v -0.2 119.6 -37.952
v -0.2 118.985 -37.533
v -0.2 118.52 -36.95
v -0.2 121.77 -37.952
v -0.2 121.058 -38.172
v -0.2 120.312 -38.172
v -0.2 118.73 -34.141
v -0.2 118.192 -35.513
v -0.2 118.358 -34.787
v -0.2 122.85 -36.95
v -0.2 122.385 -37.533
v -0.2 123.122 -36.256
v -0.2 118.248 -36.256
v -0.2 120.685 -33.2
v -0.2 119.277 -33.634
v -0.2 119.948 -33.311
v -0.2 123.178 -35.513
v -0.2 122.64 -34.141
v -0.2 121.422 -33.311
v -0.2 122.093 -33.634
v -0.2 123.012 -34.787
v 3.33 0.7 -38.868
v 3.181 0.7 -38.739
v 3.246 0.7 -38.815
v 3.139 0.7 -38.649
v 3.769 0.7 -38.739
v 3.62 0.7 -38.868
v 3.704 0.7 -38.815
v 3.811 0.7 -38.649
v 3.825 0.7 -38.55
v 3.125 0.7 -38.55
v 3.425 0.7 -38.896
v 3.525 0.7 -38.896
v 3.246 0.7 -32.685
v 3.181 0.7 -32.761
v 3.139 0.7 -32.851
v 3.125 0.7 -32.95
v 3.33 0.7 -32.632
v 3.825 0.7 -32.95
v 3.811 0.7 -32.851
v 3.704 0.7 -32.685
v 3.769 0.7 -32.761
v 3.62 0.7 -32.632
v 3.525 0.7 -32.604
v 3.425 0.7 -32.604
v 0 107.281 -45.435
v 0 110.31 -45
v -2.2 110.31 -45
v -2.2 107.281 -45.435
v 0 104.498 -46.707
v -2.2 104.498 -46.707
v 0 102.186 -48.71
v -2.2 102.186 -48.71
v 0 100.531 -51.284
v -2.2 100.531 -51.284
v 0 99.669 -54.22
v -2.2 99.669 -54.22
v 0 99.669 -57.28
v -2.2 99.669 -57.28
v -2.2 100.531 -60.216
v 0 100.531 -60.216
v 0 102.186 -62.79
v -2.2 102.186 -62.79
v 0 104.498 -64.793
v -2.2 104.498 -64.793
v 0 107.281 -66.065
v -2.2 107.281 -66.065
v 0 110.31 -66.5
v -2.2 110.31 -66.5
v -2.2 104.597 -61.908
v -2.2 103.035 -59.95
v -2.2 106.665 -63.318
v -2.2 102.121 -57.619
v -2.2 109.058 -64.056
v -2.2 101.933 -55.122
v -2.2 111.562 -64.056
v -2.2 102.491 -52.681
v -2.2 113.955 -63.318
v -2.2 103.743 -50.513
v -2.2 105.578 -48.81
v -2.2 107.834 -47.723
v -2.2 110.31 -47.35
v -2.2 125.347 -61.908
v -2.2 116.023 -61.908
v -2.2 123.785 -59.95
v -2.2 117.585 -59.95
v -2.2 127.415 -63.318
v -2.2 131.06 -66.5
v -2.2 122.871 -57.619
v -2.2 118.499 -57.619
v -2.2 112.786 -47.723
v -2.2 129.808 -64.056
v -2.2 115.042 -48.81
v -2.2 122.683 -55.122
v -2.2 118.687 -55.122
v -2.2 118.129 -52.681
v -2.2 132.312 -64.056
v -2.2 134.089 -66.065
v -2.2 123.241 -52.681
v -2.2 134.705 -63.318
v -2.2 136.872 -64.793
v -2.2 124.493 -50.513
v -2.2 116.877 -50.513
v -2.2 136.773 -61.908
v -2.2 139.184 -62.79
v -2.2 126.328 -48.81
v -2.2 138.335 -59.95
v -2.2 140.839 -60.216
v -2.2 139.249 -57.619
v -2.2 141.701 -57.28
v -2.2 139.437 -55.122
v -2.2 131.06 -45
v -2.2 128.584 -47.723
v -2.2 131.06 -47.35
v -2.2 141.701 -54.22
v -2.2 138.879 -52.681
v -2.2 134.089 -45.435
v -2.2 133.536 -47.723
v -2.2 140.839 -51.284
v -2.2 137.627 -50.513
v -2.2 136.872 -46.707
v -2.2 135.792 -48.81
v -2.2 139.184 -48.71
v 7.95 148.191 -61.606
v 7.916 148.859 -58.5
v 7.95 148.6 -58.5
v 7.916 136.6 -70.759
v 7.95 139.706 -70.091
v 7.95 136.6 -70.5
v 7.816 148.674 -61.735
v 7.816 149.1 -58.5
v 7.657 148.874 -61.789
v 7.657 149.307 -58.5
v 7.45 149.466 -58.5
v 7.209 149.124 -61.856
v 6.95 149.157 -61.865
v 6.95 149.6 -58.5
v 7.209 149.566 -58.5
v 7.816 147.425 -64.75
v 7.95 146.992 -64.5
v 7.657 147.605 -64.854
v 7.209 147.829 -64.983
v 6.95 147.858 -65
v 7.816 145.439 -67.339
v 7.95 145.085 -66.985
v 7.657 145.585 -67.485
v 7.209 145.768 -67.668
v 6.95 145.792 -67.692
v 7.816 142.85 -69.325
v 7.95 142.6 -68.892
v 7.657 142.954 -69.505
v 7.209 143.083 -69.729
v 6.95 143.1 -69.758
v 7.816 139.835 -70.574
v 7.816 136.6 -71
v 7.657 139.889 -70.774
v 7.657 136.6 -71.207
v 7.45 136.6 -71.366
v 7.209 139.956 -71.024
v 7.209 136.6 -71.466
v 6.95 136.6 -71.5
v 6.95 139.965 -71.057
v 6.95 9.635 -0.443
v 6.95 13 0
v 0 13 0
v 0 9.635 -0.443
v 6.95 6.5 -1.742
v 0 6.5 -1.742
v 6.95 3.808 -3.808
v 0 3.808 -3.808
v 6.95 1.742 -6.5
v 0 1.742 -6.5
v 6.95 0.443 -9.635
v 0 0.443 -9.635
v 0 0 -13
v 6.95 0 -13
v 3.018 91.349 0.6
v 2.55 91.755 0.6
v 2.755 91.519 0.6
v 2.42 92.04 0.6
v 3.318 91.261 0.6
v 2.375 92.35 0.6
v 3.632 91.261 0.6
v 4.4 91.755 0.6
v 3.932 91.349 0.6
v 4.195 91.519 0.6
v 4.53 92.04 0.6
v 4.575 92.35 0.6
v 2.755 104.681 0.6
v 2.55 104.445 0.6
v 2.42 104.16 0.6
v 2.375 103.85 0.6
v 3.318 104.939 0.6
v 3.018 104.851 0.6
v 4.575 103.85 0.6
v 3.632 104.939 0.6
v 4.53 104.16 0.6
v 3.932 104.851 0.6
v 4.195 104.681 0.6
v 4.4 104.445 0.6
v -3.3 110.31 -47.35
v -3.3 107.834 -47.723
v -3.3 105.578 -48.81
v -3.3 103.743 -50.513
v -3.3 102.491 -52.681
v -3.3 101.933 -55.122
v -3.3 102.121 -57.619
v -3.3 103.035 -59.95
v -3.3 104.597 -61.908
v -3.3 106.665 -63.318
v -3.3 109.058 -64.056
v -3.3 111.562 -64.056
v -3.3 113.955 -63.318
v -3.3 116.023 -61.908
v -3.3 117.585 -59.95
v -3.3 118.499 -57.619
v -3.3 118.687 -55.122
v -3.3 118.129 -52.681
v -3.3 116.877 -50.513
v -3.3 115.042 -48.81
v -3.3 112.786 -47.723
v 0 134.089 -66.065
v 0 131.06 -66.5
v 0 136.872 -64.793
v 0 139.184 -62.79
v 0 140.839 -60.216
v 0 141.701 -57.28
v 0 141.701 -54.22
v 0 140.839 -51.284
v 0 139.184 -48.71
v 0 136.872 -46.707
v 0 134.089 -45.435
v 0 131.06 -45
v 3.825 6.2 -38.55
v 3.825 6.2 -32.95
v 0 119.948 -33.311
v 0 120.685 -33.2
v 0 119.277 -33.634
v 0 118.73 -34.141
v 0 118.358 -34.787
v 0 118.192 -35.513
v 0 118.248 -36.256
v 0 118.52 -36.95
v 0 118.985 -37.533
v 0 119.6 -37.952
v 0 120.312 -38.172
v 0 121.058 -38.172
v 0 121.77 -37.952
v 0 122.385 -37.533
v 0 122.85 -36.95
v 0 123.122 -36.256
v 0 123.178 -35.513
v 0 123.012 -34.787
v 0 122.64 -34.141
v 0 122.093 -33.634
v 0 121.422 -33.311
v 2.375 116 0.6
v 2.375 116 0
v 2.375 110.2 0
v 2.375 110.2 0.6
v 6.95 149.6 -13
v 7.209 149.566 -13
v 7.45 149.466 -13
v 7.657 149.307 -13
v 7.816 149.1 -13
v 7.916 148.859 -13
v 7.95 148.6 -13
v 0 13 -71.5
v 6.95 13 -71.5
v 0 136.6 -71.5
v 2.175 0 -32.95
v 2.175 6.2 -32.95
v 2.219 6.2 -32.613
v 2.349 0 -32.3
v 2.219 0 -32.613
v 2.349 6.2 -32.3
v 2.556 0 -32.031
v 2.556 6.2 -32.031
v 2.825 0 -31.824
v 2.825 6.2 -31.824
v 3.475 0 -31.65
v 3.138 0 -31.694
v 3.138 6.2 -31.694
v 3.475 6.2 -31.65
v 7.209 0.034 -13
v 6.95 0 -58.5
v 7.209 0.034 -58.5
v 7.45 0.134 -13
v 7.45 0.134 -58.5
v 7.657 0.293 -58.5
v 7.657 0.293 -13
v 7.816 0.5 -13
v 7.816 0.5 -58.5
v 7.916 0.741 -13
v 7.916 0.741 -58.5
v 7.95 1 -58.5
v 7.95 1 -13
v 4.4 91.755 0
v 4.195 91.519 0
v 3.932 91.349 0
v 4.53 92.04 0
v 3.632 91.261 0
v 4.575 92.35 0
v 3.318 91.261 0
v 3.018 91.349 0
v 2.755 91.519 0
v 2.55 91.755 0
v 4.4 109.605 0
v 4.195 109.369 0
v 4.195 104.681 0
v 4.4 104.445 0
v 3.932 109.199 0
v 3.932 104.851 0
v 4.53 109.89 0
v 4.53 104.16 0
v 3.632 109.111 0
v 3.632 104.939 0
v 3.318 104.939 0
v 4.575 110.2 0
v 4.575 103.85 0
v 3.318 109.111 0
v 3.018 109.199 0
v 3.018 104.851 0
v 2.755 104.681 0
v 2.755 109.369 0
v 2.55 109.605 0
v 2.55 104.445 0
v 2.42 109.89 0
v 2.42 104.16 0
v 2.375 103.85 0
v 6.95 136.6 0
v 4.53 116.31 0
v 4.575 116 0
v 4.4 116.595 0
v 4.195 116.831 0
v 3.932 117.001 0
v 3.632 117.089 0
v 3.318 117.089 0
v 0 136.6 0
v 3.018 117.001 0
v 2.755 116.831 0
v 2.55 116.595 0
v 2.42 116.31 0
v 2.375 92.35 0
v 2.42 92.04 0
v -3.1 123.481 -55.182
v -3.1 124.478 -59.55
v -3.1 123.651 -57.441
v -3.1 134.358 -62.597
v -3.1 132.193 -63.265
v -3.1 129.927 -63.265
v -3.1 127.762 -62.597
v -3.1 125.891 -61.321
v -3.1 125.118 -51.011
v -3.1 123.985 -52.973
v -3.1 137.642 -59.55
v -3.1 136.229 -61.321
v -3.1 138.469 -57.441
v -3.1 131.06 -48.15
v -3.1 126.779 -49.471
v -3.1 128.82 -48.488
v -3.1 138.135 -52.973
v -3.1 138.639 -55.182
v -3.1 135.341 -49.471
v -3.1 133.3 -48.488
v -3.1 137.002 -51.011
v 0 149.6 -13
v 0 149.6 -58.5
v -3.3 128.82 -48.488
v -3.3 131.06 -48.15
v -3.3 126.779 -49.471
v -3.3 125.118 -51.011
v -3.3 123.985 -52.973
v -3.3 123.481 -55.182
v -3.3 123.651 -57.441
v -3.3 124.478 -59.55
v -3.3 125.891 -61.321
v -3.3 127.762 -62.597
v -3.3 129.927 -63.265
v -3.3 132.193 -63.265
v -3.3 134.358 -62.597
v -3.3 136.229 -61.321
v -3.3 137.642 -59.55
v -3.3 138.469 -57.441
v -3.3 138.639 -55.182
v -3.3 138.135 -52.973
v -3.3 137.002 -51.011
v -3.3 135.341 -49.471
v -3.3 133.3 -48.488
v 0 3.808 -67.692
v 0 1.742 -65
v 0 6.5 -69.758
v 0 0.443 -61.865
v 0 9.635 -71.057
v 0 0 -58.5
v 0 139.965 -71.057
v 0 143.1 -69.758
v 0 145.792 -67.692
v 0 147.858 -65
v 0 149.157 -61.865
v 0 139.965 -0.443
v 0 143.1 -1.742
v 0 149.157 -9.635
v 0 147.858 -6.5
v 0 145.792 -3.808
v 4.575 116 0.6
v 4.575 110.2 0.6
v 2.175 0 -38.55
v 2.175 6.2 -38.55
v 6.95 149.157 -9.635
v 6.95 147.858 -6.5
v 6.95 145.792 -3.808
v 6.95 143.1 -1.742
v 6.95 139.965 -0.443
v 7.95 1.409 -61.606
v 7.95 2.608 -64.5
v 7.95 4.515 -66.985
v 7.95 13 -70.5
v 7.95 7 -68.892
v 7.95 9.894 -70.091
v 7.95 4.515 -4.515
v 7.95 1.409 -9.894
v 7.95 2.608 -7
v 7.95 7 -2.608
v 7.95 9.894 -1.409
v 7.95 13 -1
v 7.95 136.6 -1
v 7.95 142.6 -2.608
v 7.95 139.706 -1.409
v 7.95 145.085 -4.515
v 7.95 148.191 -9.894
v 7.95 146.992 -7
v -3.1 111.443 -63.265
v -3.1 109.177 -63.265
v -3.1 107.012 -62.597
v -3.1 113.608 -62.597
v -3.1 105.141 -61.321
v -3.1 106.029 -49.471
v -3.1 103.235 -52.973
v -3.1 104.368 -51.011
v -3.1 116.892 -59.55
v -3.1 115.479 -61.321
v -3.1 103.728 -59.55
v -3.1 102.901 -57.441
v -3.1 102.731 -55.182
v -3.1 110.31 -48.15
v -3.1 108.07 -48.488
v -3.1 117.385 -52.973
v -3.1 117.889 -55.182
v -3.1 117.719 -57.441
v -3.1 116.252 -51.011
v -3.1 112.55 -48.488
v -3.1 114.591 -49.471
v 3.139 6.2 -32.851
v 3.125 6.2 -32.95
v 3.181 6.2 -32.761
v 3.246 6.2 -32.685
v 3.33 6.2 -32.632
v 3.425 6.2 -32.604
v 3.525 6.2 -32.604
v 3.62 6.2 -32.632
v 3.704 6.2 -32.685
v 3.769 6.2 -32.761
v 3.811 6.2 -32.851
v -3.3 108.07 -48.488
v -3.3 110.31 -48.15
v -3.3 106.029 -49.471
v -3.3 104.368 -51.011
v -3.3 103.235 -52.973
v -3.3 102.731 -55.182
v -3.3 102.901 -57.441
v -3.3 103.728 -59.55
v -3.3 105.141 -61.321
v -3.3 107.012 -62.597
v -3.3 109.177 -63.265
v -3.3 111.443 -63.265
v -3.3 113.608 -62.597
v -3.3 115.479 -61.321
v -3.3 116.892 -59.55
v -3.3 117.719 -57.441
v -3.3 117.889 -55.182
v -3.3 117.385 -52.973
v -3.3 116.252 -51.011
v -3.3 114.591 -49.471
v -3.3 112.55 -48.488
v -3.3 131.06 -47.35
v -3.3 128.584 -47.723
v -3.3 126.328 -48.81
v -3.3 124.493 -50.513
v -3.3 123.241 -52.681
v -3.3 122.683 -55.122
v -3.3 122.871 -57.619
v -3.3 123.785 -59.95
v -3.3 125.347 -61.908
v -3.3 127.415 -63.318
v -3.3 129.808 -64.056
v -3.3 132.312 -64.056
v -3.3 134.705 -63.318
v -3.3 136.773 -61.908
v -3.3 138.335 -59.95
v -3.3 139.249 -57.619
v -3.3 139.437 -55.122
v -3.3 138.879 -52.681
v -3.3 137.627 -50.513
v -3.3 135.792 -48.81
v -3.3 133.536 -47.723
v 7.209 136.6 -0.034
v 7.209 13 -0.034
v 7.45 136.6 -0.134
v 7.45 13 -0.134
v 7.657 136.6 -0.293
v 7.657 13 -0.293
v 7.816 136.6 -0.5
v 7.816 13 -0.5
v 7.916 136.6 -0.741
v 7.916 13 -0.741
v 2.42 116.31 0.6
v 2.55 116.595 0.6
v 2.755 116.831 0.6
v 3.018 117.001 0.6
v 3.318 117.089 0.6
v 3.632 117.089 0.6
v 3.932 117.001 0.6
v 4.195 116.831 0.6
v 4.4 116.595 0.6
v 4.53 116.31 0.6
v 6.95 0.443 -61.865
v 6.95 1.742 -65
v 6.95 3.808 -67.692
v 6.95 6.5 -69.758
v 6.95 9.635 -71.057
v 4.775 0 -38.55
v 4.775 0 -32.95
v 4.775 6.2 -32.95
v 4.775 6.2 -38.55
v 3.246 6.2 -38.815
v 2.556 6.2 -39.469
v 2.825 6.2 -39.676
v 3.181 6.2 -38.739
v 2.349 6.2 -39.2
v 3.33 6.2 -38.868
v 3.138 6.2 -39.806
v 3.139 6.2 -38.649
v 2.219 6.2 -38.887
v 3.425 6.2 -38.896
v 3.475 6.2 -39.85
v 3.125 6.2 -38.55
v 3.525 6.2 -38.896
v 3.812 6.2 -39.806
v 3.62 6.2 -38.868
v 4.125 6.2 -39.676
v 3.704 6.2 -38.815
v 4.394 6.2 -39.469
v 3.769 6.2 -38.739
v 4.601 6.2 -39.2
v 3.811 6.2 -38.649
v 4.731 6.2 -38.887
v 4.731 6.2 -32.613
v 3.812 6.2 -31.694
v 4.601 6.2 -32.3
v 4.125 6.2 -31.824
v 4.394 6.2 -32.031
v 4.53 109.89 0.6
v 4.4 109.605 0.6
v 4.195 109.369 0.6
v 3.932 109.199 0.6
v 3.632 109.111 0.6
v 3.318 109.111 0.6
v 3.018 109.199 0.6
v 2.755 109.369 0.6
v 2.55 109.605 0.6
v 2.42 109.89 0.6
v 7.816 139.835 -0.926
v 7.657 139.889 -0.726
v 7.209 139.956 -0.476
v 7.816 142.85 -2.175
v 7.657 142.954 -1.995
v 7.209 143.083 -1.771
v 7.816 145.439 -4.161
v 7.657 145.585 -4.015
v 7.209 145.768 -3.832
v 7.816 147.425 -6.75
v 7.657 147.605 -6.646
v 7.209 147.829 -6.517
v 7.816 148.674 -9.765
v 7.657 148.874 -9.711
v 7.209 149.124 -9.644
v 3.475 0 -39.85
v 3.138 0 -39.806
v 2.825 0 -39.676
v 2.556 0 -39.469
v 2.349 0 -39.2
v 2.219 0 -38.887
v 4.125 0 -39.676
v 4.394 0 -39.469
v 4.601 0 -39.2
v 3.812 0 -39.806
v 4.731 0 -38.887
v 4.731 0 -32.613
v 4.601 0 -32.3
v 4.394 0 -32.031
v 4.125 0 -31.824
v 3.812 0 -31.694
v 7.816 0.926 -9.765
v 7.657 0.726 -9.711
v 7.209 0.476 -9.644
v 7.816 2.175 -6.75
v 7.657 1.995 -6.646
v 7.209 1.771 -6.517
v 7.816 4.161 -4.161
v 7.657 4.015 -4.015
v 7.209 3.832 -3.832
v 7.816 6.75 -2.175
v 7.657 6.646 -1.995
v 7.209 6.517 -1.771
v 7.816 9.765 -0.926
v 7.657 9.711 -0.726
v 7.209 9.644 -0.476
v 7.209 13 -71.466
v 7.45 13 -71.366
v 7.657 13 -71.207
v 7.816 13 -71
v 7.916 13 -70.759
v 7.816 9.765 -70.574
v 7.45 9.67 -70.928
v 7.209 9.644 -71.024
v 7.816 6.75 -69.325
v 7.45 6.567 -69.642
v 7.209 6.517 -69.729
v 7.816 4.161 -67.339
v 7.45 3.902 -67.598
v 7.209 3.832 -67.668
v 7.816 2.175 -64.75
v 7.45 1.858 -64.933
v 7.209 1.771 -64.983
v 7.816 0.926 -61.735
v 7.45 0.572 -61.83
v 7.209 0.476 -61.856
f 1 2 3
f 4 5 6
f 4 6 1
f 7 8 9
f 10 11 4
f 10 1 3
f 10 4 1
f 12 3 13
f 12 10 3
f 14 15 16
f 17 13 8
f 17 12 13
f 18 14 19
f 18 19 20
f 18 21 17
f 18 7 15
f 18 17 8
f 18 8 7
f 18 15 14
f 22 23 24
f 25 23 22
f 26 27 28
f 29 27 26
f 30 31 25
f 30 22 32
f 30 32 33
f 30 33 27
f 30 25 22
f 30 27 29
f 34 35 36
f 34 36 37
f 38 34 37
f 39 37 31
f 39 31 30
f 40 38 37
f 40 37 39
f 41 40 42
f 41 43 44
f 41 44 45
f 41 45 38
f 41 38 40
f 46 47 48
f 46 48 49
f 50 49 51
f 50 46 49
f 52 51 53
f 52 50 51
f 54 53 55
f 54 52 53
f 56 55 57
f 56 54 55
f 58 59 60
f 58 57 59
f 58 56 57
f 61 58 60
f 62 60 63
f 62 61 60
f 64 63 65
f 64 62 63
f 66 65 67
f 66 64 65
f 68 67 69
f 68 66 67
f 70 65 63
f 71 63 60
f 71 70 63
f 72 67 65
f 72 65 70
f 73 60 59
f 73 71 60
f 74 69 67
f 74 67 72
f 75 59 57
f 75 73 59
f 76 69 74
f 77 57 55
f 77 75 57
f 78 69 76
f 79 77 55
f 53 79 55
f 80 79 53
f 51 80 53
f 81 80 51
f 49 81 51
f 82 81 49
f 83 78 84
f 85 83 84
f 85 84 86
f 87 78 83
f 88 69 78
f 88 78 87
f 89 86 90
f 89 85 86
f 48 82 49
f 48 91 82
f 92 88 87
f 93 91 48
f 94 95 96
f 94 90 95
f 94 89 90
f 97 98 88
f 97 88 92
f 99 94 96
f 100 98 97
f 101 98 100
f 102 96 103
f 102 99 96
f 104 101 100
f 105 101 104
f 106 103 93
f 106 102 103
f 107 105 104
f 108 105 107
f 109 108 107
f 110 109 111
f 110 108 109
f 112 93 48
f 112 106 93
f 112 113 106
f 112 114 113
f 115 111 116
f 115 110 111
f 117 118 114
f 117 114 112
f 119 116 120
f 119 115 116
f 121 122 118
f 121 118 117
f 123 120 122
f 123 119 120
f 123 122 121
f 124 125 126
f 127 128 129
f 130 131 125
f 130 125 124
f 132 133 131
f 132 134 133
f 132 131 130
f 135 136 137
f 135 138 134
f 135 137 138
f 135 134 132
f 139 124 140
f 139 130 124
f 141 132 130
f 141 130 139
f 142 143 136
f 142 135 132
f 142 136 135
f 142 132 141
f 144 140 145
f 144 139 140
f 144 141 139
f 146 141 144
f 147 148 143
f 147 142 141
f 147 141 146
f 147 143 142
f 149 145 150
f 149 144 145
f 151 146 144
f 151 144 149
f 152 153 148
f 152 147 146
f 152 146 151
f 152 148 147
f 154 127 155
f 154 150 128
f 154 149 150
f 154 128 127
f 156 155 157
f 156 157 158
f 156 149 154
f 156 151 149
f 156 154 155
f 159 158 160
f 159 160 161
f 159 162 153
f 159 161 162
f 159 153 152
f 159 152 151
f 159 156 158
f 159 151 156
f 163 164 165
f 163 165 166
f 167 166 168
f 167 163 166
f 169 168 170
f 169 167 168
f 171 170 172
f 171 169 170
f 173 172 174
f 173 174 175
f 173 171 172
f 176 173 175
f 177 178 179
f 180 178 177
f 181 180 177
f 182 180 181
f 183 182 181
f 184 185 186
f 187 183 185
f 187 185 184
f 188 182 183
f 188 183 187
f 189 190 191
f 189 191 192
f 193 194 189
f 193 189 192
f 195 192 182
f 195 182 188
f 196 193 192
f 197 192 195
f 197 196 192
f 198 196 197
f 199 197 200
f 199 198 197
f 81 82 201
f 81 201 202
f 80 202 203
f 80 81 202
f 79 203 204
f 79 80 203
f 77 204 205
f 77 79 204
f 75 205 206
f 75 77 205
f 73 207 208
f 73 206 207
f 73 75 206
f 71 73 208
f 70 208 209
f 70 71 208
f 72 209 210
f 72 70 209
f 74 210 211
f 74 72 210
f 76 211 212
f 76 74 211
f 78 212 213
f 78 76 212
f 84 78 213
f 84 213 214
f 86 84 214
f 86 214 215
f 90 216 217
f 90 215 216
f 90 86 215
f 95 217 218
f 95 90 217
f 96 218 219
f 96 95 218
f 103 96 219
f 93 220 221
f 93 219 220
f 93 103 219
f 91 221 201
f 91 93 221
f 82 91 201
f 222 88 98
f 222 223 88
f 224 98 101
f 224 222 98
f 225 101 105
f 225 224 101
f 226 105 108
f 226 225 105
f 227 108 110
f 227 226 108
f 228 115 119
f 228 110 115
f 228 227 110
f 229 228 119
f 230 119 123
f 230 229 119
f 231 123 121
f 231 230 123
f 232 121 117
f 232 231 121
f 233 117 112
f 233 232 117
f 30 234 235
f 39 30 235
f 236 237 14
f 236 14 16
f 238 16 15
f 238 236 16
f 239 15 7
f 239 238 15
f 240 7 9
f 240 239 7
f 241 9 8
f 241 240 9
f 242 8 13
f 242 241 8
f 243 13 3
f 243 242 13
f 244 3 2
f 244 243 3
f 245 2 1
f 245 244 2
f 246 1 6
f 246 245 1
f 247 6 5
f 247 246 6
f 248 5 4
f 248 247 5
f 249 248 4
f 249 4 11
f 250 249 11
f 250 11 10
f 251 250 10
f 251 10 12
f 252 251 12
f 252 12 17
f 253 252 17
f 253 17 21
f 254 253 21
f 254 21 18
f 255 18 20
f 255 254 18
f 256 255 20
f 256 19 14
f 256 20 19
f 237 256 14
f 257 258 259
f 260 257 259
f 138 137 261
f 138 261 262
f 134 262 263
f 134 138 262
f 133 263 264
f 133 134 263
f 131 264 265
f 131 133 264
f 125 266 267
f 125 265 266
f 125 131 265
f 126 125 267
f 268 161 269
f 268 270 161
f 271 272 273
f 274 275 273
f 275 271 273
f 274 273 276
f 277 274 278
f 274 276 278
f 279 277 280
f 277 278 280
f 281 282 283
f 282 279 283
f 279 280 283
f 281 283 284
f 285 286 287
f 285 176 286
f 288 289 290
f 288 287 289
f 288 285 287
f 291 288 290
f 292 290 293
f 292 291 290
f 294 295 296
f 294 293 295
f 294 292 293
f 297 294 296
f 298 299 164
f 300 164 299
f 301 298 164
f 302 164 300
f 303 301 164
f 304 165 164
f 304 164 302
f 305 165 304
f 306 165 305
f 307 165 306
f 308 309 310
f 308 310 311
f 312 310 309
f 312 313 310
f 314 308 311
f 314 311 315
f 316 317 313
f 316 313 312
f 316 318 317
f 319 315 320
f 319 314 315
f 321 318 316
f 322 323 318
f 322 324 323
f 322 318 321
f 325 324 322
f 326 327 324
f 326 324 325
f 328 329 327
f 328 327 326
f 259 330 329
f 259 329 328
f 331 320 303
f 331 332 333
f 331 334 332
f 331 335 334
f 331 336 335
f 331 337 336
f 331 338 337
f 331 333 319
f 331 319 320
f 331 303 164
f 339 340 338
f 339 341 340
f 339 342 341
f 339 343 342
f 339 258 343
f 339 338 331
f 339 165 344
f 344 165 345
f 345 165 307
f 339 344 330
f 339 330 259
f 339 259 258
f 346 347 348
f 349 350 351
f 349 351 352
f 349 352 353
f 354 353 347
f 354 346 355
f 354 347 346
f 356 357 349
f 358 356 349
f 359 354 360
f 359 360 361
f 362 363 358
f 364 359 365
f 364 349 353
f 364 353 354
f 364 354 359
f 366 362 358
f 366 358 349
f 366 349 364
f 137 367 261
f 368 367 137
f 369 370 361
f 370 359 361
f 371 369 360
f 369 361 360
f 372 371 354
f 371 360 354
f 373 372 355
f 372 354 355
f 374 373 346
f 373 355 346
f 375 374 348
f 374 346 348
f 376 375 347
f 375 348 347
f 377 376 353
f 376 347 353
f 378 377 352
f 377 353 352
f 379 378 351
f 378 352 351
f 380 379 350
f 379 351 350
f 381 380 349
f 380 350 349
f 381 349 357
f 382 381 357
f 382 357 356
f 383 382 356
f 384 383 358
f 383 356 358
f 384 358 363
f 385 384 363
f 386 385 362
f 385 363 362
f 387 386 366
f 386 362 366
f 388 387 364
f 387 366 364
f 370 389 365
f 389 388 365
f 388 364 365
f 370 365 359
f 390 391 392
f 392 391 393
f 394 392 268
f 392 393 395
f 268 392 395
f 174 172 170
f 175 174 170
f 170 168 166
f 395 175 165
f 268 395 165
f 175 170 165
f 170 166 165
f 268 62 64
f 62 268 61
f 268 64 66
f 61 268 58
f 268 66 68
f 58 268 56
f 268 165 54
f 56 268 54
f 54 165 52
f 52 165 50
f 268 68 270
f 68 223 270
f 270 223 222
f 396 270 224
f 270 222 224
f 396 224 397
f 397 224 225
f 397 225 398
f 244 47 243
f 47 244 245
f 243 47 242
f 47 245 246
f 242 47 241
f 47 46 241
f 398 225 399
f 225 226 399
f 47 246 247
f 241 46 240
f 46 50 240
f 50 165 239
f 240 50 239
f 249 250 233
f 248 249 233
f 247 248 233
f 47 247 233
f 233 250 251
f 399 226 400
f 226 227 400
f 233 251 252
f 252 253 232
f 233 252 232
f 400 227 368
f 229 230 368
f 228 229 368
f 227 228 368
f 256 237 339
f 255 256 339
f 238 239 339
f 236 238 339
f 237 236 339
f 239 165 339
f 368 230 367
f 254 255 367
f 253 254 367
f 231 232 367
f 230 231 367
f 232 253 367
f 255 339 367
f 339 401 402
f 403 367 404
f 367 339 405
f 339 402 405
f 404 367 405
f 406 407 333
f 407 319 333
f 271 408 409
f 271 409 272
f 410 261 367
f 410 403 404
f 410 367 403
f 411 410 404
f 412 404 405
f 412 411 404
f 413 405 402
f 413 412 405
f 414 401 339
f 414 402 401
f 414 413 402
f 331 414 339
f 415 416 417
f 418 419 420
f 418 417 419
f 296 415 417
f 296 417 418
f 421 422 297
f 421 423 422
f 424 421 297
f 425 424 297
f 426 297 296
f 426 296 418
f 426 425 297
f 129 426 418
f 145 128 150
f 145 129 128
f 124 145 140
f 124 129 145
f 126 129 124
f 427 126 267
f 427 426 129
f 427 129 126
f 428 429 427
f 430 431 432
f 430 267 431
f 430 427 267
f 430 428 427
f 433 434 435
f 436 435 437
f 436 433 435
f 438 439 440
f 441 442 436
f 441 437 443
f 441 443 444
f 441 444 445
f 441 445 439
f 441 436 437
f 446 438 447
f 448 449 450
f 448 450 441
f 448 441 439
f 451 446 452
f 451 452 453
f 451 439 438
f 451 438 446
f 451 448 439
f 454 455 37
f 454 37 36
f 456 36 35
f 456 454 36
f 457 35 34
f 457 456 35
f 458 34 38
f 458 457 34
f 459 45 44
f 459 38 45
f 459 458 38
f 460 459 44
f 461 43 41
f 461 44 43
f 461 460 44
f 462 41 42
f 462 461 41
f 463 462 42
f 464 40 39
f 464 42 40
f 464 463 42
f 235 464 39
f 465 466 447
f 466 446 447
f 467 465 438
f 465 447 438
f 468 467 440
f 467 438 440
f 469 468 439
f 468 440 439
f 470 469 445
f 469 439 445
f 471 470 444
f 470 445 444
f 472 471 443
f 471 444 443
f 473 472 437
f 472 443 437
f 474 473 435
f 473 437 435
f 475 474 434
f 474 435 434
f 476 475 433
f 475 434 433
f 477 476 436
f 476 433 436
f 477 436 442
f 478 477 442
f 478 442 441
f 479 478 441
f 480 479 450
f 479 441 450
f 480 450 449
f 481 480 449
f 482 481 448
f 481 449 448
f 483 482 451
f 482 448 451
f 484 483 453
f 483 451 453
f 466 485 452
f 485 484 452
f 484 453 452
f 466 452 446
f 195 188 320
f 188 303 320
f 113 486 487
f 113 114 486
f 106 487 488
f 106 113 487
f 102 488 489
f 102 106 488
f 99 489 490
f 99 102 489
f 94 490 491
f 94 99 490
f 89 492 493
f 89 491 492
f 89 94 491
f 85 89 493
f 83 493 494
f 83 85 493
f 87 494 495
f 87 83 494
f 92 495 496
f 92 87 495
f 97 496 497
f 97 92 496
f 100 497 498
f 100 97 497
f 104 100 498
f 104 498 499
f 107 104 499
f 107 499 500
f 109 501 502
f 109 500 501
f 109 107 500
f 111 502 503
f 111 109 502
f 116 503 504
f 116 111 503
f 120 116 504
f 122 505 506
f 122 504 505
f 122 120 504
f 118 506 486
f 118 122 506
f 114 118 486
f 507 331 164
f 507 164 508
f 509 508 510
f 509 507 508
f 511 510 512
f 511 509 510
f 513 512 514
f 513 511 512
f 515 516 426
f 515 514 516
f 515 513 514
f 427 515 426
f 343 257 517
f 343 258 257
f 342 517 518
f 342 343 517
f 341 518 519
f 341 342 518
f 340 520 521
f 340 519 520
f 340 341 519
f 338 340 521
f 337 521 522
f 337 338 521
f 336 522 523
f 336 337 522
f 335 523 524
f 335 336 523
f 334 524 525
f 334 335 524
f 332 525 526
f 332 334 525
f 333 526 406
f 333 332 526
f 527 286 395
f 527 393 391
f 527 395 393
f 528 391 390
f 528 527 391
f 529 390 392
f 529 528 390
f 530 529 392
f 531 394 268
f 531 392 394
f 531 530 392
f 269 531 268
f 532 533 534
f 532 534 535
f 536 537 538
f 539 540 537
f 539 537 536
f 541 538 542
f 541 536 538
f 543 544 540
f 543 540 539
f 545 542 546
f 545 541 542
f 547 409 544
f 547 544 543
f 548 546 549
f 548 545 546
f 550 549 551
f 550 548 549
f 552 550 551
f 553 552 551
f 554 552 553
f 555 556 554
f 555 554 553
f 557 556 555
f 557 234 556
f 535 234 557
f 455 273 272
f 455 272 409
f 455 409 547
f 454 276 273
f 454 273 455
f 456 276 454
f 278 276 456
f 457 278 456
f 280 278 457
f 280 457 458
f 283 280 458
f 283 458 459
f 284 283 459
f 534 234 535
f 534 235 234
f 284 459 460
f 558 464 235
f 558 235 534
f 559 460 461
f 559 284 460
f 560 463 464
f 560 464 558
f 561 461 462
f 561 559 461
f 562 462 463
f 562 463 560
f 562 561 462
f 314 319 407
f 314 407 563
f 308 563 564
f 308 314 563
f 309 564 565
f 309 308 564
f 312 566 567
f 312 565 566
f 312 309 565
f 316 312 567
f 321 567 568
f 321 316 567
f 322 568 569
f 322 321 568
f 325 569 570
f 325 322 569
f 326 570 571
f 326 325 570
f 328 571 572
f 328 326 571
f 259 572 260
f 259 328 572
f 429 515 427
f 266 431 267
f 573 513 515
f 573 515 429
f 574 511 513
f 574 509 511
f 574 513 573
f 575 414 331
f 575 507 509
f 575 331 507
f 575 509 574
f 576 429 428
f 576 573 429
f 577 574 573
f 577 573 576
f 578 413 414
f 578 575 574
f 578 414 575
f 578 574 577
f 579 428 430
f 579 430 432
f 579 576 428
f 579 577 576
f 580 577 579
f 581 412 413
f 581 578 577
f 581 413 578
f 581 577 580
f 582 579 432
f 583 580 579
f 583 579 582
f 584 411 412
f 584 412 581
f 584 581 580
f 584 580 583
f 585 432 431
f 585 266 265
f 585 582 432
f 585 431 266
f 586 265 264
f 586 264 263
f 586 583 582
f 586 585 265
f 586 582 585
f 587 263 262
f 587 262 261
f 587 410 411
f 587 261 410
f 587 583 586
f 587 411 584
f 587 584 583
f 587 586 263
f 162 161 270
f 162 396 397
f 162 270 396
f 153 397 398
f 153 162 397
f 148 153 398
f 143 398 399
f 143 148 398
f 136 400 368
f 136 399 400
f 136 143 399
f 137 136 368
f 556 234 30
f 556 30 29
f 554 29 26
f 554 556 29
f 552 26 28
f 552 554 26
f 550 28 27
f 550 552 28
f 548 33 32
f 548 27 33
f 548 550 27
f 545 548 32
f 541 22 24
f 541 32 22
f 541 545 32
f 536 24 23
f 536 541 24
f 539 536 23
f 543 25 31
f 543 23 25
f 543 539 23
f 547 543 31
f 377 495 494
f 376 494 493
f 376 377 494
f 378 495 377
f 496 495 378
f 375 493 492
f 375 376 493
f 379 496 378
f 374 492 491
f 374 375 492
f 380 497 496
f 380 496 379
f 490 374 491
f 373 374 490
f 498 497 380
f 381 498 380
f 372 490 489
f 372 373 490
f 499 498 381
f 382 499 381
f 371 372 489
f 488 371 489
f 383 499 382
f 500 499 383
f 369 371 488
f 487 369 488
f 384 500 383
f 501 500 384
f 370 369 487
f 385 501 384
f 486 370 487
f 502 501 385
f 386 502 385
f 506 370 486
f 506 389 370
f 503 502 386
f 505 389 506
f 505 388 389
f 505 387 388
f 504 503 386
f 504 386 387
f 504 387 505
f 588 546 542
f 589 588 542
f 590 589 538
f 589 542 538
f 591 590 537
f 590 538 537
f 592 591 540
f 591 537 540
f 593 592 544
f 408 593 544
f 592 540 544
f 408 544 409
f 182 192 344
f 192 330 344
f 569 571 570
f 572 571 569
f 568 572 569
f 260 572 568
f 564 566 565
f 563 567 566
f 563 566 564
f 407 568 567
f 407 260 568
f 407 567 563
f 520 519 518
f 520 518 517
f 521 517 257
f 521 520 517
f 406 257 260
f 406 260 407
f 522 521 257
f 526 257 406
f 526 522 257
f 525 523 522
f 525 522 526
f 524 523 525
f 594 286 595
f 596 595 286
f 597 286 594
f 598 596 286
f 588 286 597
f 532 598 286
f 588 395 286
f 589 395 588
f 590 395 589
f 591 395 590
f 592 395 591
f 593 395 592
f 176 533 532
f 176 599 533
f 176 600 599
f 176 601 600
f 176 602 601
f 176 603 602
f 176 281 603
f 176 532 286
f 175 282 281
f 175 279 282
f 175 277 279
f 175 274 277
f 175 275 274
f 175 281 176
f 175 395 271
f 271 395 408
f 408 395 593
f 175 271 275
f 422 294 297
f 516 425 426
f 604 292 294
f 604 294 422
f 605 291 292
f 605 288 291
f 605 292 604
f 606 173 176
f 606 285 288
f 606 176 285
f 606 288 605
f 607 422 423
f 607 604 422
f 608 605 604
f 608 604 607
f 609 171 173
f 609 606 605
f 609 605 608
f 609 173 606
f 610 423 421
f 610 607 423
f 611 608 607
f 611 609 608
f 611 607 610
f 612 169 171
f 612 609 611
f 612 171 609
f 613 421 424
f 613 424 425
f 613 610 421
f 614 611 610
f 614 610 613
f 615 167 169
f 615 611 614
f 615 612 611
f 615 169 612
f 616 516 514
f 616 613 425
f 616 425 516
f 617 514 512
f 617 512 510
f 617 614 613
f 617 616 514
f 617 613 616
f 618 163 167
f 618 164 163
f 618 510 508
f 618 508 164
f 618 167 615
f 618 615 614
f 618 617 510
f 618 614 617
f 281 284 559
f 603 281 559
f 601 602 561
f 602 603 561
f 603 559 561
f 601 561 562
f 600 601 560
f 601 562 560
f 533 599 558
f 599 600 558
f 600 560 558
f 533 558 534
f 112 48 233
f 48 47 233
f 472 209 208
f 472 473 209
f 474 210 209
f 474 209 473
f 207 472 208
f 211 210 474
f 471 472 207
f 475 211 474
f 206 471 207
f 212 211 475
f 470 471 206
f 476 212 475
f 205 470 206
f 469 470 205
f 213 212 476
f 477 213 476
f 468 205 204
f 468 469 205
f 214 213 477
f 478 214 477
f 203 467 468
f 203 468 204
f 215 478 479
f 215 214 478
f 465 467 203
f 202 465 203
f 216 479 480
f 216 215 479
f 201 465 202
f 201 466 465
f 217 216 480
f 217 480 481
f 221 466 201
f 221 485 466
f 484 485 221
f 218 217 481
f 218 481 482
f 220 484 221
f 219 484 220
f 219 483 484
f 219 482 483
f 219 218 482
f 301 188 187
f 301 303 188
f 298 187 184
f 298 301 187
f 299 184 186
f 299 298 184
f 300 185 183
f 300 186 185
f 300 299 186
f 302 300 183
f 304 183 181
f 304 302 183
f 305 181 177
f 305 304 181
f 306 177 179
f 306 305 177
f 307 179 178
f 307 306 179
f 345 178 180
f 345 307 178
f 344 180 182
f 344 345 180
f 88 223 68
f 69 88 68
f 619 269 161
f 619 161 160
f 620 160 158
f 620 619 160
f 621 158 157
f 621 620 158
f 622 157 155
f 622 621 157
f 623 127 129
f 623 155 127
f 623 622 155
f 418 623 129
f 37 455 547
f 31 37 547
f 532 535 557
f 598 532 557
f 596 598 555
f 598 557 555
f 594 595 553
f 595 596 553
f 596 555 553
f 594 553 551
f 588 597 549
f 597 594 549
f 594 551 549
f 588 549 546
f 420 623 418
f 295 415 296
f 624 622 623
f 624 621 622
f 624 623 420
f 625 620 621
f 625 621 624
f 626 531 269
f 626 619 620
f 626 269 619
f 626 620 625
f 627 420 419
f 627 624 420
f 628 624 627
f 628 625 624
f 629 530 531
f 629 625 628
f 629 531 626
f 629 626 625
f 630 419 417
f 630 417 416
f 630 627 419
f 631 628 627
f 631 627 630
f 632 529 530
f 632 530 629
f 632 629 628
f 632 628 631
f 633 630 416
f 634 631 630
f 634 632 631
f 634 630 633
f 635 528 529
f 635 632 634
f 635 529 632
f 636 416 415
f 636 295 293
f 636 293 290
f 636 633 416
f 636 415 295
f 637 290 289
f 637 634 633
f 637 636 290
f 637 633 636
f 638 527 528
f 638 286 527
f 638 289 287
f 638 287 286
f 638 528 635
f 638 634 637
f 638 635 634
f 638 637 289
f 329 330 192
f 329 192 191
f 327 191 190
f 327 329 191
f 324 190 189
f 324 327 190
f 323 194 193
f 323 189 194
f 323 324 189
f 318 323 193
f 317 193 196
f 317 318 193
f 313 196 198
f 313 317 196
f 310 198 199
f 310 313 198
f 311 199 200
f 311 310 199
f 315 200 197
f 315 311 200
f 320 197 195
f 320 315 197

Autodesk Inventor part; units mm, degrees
ref_plane "YZ Plane" through (0, 0, 0) normal (1, 0, 0) x (0, 1, 0)
ref_plane "XZ Plane" through (0, 0, 0) normal (0, 1, 0) x (-1, 0, 0)
ref_plane "XY Plane" through (0, 0, 0) normal (0, 0, 1) x (1, 0, 0)
sketch "Esboço1" plane through (0, 0, 0) normal (1, 0, 0) x (0, 1, 0)
  line L0 (0, 0) -> (149.6, 0)
  line L1 (149.6, 0) -> (149.6, -71.5)
  line L2 (149.6, -71.5) -> (0, -71.5)
  line L3 (0, -71.5) -> (0, 0)
  dimension "d0" = 149.6
  dimension "d1" = 71.5
extrude "Extrusão1" add sketch "Esboço1" along normal blind 7.95
fillet "Arredondamento1" radius 13 4 edges at (3.975, 149.6, -71.5) (3.975, 149.6, 0) (3.975, 0, 0) (3.975, 0, -71.5)
fillet "Arredondamento2" radius 1 8 edges at (7.95, 0, -35.75) (7.95, 3.8076, -67.6924) (7.95, 74.8, -71.5) (7.95, 145.7924, -67.6924) (7.95, 149.6, -35.75) (7.95, 145.7924, -3.8076) (7.95, 74.8, 0) (7.95, 3.8076, -3.8076)
sketch "Esboço2" plane through (0, 0, -58.5) normal (0, -1, 0) x (1, 0, 0)
  line L0 (6.95, 0) -> (0, 0) projected
  line L1 (0, 45.5) -> (6.95, 45.5) projected
  line L2 (3.475, 18.65) -> (4.775, 18.65)
  line L3 (4.775, 18.65) -> (2.175, 18.65)
  line L4 (2.175, 18.65) -> (2.175, 26.85)
  line L5 (2.175, 26.85) -> (4.775, 26.85)
  line L6 (4.775, 26.85) -> (4.775, 18.65)
  point P0 (0, 58.5)
extrude "Extrusão2" cut sketch "Esboço2" against normal blind 6.2
fillet "Arredondamento3" radius 1.3 4 edges at (4.775, 3.1, -39.85) (2.175, 3.1, -39.85) (4.775, 3.1, -31.65) (2.175, 3.1, -31.65)
sketch "Esboço3" plane through (0, 6.2, -58.5) normal (0, -1, 0) x (1, 0, 0)
  arc A0 (4.775, 25.55) -> (2.175, 25.55) centre (3.475, 25.55) ccw projected
  arc A1 (2.175, 19.95) -> (4.775, 19.95) centre (3.475, 19.95) ccw projected
  line L0 (3.475, 25.55) -> (3.475, 19.95) construction
  line L1 (3.125, 25.55) -> (3.125, 19.95)
  line L2 (3.825, 19.95) -> (3.825, 25.55)
  arc A2 (3.825, 25.55) -> (3.125, 25.55) centre (3.475, 25.55) ccw
  arc A3 (3.125, 19.95) -> (3.825, 19.95) centre (3.475, 19.95) ccw
  point P0 (0, 58.5)
  point P1 (3.475, 22.75)
extrude "Extrusão3" add sketch "Esboço3" along normal blind 5.5
sketch "Esboço4" plane through (0, 0, 0) normal (-1, 0, 0) x (0, 0, 1)
  line L0 (-58.5, 149.6) -> (-13, 149.6) projected
  arc A0 (-58.5, 148.6) -> (-70.5, 136.6) centre (-58.5, 136.6) ccw projected
  line L1 (-66.5, 131.06) -> (-66.5, 110.31)
  line L2 (-45, 110.31) -> (-45, 131.06)
  arc A1 (-45, 131.06) -> (-66.5, 131.06) centre (-55.75, 131.06) ccw
  arc A2 (-66.5, 110.31) -> (-45, 110.31) centre (-55.75, 110.31) ccw
  circle A3 centre (-55.75, 131.06) radius 8.4
  circle A4 centre (-55.75, 131.06) radius 7.6
  circle A5 centre (-55.75, 131.06) radius 5.75
  circle A6 centre (-55.75, 110.31) radius 8.4
  circle A7 centre (-55.75, 110.31) radius 7.6
  circle A8 centre (-55.75, 110.31) radius 5.75
  point P0 (0, 0)
extrude "Extrusão4" add sketch "Esboço4" along normal blind 2.2 contours A1 L2 A2 L1
sketch "Esboço5" plane through (0, 0, 0) normal (-1, 0, 0) x (0, 0, 1)
  circle A0 centre (-55.75, 131.06) radius 8.4 projected
  circle A1 centre (-55.75, 131.06) radius 7.6
  circle A2 centre (-55.75, 131.06) radius 5.75
  circle A3 centre (-55.75, 131.06) radius 8.4
  point P0 (0, 0)
extrude "Extrusão5" add sketch "Esboço5" along normal blind 3.3 contours A0
sketch "Esboço6" plane through (0, 131.06, -55.75) normal (-1, 0, 0) x (0, 0, 1)
  circle A0 centre (0, -20.75) radius 8.4 projected
  circle A1 centre (0, -20.75) radius 8.4
  circle A2 centre (0, -20.75) radius 7.6
  point P0 (55.75, -131.06)
extrude "Extrusão6" add sketch "Esboço6" along normal blind 3.3
sketch "Esboço7" plane through (0, 131.06, -55.75) normal (-1, 0, 0) x (0, 0, 1)
  circle A0 centre (0, 0) radius 7.6
  circle A1 centre (0, -20.75) radius 7.6 projected
  circle A2 centre (0, -20.75) radius 7.6
  point P0 (55.75, -131.06)
  dimension "d38" = 15.2
  dimension "d40" = 15.2
extrude "Extrusão7" add sketch "Esboço7" along normal blind 3.1
sketch "Esboço8" plane through (0, 0, 0) normal (-1, 0, 0) x (0, 0, 1)
  line L0 (-45, 110.31) -> (-45, 131.06) projected
  circle A0 centre (-35.7, 120.685) radius 2.5
  circle A1 centre (-35.7, 120.685) radius 2.3
  point P0 (0, 0)
  dimension "d45" = 4.6
extrude "Extrusão8" add sketch "Esboço8" along normal blind 0.2 contours A0 | A1
sketch "Esboço9" plane through (0, 13, 0) normal (0, 0, 1) x (1, 0, 0)
  line L0 (0, 136.6) -> (6.95, 136.6) projected
  line L1 (2.375, 103) -> (2.375, 97.2)
  line L2 (4.575, 97.2) -> (4.575, 103)
  arc A0 (4.575, 103) -> (2.375, 103) centre (3.475, 103) ccw
  arc A1 (2.375, 97.2) -> (4.575, 97.2) centre (3.475, 97.2) ccw
  line L3 (3.475, 79.35) -> (3.475, 90.85) construction
  line L4 (4.575, 79.35) -> (4.575, 90.85)
  line L5 (2.375, 90.85) -> (2.375, 79.35)
  arc A2 (2.375, 79.35) -> (4.575, 79.35) centre (3.475, 79.35) ccw
  arc A3 (4.575, 90.85) -> (2.375, 90.85) centre (3.475, 90.85) ccw
  point P0 (0, -13)
sketch "Esboço10" plane through (0, 13, 0) normal (0, 0, 1) x (1, 0, 0)
  line L0 (3.4735, 64.3614) -> (3.4735, 75.8614) construction
  line L1 (4.5735, 64.3614) -> (4.5735, 75.8614)
  line L2 (2.3735, 75.8614) -> (2.3735, 64.3614)
  arc A0 (2.3735, 64.3614) -> (4.5735, 64.3614) centre (3.4735, 64.3614) ccw
  arc A1 (4.5735, 75.8614) -> (2.3735, 75.8614) centre (3.4735, 75.8614) ccw
  point P0 (0, -13)
extrude "Extrusão9" add sketch "Esboço9" along normal blind 0.6
